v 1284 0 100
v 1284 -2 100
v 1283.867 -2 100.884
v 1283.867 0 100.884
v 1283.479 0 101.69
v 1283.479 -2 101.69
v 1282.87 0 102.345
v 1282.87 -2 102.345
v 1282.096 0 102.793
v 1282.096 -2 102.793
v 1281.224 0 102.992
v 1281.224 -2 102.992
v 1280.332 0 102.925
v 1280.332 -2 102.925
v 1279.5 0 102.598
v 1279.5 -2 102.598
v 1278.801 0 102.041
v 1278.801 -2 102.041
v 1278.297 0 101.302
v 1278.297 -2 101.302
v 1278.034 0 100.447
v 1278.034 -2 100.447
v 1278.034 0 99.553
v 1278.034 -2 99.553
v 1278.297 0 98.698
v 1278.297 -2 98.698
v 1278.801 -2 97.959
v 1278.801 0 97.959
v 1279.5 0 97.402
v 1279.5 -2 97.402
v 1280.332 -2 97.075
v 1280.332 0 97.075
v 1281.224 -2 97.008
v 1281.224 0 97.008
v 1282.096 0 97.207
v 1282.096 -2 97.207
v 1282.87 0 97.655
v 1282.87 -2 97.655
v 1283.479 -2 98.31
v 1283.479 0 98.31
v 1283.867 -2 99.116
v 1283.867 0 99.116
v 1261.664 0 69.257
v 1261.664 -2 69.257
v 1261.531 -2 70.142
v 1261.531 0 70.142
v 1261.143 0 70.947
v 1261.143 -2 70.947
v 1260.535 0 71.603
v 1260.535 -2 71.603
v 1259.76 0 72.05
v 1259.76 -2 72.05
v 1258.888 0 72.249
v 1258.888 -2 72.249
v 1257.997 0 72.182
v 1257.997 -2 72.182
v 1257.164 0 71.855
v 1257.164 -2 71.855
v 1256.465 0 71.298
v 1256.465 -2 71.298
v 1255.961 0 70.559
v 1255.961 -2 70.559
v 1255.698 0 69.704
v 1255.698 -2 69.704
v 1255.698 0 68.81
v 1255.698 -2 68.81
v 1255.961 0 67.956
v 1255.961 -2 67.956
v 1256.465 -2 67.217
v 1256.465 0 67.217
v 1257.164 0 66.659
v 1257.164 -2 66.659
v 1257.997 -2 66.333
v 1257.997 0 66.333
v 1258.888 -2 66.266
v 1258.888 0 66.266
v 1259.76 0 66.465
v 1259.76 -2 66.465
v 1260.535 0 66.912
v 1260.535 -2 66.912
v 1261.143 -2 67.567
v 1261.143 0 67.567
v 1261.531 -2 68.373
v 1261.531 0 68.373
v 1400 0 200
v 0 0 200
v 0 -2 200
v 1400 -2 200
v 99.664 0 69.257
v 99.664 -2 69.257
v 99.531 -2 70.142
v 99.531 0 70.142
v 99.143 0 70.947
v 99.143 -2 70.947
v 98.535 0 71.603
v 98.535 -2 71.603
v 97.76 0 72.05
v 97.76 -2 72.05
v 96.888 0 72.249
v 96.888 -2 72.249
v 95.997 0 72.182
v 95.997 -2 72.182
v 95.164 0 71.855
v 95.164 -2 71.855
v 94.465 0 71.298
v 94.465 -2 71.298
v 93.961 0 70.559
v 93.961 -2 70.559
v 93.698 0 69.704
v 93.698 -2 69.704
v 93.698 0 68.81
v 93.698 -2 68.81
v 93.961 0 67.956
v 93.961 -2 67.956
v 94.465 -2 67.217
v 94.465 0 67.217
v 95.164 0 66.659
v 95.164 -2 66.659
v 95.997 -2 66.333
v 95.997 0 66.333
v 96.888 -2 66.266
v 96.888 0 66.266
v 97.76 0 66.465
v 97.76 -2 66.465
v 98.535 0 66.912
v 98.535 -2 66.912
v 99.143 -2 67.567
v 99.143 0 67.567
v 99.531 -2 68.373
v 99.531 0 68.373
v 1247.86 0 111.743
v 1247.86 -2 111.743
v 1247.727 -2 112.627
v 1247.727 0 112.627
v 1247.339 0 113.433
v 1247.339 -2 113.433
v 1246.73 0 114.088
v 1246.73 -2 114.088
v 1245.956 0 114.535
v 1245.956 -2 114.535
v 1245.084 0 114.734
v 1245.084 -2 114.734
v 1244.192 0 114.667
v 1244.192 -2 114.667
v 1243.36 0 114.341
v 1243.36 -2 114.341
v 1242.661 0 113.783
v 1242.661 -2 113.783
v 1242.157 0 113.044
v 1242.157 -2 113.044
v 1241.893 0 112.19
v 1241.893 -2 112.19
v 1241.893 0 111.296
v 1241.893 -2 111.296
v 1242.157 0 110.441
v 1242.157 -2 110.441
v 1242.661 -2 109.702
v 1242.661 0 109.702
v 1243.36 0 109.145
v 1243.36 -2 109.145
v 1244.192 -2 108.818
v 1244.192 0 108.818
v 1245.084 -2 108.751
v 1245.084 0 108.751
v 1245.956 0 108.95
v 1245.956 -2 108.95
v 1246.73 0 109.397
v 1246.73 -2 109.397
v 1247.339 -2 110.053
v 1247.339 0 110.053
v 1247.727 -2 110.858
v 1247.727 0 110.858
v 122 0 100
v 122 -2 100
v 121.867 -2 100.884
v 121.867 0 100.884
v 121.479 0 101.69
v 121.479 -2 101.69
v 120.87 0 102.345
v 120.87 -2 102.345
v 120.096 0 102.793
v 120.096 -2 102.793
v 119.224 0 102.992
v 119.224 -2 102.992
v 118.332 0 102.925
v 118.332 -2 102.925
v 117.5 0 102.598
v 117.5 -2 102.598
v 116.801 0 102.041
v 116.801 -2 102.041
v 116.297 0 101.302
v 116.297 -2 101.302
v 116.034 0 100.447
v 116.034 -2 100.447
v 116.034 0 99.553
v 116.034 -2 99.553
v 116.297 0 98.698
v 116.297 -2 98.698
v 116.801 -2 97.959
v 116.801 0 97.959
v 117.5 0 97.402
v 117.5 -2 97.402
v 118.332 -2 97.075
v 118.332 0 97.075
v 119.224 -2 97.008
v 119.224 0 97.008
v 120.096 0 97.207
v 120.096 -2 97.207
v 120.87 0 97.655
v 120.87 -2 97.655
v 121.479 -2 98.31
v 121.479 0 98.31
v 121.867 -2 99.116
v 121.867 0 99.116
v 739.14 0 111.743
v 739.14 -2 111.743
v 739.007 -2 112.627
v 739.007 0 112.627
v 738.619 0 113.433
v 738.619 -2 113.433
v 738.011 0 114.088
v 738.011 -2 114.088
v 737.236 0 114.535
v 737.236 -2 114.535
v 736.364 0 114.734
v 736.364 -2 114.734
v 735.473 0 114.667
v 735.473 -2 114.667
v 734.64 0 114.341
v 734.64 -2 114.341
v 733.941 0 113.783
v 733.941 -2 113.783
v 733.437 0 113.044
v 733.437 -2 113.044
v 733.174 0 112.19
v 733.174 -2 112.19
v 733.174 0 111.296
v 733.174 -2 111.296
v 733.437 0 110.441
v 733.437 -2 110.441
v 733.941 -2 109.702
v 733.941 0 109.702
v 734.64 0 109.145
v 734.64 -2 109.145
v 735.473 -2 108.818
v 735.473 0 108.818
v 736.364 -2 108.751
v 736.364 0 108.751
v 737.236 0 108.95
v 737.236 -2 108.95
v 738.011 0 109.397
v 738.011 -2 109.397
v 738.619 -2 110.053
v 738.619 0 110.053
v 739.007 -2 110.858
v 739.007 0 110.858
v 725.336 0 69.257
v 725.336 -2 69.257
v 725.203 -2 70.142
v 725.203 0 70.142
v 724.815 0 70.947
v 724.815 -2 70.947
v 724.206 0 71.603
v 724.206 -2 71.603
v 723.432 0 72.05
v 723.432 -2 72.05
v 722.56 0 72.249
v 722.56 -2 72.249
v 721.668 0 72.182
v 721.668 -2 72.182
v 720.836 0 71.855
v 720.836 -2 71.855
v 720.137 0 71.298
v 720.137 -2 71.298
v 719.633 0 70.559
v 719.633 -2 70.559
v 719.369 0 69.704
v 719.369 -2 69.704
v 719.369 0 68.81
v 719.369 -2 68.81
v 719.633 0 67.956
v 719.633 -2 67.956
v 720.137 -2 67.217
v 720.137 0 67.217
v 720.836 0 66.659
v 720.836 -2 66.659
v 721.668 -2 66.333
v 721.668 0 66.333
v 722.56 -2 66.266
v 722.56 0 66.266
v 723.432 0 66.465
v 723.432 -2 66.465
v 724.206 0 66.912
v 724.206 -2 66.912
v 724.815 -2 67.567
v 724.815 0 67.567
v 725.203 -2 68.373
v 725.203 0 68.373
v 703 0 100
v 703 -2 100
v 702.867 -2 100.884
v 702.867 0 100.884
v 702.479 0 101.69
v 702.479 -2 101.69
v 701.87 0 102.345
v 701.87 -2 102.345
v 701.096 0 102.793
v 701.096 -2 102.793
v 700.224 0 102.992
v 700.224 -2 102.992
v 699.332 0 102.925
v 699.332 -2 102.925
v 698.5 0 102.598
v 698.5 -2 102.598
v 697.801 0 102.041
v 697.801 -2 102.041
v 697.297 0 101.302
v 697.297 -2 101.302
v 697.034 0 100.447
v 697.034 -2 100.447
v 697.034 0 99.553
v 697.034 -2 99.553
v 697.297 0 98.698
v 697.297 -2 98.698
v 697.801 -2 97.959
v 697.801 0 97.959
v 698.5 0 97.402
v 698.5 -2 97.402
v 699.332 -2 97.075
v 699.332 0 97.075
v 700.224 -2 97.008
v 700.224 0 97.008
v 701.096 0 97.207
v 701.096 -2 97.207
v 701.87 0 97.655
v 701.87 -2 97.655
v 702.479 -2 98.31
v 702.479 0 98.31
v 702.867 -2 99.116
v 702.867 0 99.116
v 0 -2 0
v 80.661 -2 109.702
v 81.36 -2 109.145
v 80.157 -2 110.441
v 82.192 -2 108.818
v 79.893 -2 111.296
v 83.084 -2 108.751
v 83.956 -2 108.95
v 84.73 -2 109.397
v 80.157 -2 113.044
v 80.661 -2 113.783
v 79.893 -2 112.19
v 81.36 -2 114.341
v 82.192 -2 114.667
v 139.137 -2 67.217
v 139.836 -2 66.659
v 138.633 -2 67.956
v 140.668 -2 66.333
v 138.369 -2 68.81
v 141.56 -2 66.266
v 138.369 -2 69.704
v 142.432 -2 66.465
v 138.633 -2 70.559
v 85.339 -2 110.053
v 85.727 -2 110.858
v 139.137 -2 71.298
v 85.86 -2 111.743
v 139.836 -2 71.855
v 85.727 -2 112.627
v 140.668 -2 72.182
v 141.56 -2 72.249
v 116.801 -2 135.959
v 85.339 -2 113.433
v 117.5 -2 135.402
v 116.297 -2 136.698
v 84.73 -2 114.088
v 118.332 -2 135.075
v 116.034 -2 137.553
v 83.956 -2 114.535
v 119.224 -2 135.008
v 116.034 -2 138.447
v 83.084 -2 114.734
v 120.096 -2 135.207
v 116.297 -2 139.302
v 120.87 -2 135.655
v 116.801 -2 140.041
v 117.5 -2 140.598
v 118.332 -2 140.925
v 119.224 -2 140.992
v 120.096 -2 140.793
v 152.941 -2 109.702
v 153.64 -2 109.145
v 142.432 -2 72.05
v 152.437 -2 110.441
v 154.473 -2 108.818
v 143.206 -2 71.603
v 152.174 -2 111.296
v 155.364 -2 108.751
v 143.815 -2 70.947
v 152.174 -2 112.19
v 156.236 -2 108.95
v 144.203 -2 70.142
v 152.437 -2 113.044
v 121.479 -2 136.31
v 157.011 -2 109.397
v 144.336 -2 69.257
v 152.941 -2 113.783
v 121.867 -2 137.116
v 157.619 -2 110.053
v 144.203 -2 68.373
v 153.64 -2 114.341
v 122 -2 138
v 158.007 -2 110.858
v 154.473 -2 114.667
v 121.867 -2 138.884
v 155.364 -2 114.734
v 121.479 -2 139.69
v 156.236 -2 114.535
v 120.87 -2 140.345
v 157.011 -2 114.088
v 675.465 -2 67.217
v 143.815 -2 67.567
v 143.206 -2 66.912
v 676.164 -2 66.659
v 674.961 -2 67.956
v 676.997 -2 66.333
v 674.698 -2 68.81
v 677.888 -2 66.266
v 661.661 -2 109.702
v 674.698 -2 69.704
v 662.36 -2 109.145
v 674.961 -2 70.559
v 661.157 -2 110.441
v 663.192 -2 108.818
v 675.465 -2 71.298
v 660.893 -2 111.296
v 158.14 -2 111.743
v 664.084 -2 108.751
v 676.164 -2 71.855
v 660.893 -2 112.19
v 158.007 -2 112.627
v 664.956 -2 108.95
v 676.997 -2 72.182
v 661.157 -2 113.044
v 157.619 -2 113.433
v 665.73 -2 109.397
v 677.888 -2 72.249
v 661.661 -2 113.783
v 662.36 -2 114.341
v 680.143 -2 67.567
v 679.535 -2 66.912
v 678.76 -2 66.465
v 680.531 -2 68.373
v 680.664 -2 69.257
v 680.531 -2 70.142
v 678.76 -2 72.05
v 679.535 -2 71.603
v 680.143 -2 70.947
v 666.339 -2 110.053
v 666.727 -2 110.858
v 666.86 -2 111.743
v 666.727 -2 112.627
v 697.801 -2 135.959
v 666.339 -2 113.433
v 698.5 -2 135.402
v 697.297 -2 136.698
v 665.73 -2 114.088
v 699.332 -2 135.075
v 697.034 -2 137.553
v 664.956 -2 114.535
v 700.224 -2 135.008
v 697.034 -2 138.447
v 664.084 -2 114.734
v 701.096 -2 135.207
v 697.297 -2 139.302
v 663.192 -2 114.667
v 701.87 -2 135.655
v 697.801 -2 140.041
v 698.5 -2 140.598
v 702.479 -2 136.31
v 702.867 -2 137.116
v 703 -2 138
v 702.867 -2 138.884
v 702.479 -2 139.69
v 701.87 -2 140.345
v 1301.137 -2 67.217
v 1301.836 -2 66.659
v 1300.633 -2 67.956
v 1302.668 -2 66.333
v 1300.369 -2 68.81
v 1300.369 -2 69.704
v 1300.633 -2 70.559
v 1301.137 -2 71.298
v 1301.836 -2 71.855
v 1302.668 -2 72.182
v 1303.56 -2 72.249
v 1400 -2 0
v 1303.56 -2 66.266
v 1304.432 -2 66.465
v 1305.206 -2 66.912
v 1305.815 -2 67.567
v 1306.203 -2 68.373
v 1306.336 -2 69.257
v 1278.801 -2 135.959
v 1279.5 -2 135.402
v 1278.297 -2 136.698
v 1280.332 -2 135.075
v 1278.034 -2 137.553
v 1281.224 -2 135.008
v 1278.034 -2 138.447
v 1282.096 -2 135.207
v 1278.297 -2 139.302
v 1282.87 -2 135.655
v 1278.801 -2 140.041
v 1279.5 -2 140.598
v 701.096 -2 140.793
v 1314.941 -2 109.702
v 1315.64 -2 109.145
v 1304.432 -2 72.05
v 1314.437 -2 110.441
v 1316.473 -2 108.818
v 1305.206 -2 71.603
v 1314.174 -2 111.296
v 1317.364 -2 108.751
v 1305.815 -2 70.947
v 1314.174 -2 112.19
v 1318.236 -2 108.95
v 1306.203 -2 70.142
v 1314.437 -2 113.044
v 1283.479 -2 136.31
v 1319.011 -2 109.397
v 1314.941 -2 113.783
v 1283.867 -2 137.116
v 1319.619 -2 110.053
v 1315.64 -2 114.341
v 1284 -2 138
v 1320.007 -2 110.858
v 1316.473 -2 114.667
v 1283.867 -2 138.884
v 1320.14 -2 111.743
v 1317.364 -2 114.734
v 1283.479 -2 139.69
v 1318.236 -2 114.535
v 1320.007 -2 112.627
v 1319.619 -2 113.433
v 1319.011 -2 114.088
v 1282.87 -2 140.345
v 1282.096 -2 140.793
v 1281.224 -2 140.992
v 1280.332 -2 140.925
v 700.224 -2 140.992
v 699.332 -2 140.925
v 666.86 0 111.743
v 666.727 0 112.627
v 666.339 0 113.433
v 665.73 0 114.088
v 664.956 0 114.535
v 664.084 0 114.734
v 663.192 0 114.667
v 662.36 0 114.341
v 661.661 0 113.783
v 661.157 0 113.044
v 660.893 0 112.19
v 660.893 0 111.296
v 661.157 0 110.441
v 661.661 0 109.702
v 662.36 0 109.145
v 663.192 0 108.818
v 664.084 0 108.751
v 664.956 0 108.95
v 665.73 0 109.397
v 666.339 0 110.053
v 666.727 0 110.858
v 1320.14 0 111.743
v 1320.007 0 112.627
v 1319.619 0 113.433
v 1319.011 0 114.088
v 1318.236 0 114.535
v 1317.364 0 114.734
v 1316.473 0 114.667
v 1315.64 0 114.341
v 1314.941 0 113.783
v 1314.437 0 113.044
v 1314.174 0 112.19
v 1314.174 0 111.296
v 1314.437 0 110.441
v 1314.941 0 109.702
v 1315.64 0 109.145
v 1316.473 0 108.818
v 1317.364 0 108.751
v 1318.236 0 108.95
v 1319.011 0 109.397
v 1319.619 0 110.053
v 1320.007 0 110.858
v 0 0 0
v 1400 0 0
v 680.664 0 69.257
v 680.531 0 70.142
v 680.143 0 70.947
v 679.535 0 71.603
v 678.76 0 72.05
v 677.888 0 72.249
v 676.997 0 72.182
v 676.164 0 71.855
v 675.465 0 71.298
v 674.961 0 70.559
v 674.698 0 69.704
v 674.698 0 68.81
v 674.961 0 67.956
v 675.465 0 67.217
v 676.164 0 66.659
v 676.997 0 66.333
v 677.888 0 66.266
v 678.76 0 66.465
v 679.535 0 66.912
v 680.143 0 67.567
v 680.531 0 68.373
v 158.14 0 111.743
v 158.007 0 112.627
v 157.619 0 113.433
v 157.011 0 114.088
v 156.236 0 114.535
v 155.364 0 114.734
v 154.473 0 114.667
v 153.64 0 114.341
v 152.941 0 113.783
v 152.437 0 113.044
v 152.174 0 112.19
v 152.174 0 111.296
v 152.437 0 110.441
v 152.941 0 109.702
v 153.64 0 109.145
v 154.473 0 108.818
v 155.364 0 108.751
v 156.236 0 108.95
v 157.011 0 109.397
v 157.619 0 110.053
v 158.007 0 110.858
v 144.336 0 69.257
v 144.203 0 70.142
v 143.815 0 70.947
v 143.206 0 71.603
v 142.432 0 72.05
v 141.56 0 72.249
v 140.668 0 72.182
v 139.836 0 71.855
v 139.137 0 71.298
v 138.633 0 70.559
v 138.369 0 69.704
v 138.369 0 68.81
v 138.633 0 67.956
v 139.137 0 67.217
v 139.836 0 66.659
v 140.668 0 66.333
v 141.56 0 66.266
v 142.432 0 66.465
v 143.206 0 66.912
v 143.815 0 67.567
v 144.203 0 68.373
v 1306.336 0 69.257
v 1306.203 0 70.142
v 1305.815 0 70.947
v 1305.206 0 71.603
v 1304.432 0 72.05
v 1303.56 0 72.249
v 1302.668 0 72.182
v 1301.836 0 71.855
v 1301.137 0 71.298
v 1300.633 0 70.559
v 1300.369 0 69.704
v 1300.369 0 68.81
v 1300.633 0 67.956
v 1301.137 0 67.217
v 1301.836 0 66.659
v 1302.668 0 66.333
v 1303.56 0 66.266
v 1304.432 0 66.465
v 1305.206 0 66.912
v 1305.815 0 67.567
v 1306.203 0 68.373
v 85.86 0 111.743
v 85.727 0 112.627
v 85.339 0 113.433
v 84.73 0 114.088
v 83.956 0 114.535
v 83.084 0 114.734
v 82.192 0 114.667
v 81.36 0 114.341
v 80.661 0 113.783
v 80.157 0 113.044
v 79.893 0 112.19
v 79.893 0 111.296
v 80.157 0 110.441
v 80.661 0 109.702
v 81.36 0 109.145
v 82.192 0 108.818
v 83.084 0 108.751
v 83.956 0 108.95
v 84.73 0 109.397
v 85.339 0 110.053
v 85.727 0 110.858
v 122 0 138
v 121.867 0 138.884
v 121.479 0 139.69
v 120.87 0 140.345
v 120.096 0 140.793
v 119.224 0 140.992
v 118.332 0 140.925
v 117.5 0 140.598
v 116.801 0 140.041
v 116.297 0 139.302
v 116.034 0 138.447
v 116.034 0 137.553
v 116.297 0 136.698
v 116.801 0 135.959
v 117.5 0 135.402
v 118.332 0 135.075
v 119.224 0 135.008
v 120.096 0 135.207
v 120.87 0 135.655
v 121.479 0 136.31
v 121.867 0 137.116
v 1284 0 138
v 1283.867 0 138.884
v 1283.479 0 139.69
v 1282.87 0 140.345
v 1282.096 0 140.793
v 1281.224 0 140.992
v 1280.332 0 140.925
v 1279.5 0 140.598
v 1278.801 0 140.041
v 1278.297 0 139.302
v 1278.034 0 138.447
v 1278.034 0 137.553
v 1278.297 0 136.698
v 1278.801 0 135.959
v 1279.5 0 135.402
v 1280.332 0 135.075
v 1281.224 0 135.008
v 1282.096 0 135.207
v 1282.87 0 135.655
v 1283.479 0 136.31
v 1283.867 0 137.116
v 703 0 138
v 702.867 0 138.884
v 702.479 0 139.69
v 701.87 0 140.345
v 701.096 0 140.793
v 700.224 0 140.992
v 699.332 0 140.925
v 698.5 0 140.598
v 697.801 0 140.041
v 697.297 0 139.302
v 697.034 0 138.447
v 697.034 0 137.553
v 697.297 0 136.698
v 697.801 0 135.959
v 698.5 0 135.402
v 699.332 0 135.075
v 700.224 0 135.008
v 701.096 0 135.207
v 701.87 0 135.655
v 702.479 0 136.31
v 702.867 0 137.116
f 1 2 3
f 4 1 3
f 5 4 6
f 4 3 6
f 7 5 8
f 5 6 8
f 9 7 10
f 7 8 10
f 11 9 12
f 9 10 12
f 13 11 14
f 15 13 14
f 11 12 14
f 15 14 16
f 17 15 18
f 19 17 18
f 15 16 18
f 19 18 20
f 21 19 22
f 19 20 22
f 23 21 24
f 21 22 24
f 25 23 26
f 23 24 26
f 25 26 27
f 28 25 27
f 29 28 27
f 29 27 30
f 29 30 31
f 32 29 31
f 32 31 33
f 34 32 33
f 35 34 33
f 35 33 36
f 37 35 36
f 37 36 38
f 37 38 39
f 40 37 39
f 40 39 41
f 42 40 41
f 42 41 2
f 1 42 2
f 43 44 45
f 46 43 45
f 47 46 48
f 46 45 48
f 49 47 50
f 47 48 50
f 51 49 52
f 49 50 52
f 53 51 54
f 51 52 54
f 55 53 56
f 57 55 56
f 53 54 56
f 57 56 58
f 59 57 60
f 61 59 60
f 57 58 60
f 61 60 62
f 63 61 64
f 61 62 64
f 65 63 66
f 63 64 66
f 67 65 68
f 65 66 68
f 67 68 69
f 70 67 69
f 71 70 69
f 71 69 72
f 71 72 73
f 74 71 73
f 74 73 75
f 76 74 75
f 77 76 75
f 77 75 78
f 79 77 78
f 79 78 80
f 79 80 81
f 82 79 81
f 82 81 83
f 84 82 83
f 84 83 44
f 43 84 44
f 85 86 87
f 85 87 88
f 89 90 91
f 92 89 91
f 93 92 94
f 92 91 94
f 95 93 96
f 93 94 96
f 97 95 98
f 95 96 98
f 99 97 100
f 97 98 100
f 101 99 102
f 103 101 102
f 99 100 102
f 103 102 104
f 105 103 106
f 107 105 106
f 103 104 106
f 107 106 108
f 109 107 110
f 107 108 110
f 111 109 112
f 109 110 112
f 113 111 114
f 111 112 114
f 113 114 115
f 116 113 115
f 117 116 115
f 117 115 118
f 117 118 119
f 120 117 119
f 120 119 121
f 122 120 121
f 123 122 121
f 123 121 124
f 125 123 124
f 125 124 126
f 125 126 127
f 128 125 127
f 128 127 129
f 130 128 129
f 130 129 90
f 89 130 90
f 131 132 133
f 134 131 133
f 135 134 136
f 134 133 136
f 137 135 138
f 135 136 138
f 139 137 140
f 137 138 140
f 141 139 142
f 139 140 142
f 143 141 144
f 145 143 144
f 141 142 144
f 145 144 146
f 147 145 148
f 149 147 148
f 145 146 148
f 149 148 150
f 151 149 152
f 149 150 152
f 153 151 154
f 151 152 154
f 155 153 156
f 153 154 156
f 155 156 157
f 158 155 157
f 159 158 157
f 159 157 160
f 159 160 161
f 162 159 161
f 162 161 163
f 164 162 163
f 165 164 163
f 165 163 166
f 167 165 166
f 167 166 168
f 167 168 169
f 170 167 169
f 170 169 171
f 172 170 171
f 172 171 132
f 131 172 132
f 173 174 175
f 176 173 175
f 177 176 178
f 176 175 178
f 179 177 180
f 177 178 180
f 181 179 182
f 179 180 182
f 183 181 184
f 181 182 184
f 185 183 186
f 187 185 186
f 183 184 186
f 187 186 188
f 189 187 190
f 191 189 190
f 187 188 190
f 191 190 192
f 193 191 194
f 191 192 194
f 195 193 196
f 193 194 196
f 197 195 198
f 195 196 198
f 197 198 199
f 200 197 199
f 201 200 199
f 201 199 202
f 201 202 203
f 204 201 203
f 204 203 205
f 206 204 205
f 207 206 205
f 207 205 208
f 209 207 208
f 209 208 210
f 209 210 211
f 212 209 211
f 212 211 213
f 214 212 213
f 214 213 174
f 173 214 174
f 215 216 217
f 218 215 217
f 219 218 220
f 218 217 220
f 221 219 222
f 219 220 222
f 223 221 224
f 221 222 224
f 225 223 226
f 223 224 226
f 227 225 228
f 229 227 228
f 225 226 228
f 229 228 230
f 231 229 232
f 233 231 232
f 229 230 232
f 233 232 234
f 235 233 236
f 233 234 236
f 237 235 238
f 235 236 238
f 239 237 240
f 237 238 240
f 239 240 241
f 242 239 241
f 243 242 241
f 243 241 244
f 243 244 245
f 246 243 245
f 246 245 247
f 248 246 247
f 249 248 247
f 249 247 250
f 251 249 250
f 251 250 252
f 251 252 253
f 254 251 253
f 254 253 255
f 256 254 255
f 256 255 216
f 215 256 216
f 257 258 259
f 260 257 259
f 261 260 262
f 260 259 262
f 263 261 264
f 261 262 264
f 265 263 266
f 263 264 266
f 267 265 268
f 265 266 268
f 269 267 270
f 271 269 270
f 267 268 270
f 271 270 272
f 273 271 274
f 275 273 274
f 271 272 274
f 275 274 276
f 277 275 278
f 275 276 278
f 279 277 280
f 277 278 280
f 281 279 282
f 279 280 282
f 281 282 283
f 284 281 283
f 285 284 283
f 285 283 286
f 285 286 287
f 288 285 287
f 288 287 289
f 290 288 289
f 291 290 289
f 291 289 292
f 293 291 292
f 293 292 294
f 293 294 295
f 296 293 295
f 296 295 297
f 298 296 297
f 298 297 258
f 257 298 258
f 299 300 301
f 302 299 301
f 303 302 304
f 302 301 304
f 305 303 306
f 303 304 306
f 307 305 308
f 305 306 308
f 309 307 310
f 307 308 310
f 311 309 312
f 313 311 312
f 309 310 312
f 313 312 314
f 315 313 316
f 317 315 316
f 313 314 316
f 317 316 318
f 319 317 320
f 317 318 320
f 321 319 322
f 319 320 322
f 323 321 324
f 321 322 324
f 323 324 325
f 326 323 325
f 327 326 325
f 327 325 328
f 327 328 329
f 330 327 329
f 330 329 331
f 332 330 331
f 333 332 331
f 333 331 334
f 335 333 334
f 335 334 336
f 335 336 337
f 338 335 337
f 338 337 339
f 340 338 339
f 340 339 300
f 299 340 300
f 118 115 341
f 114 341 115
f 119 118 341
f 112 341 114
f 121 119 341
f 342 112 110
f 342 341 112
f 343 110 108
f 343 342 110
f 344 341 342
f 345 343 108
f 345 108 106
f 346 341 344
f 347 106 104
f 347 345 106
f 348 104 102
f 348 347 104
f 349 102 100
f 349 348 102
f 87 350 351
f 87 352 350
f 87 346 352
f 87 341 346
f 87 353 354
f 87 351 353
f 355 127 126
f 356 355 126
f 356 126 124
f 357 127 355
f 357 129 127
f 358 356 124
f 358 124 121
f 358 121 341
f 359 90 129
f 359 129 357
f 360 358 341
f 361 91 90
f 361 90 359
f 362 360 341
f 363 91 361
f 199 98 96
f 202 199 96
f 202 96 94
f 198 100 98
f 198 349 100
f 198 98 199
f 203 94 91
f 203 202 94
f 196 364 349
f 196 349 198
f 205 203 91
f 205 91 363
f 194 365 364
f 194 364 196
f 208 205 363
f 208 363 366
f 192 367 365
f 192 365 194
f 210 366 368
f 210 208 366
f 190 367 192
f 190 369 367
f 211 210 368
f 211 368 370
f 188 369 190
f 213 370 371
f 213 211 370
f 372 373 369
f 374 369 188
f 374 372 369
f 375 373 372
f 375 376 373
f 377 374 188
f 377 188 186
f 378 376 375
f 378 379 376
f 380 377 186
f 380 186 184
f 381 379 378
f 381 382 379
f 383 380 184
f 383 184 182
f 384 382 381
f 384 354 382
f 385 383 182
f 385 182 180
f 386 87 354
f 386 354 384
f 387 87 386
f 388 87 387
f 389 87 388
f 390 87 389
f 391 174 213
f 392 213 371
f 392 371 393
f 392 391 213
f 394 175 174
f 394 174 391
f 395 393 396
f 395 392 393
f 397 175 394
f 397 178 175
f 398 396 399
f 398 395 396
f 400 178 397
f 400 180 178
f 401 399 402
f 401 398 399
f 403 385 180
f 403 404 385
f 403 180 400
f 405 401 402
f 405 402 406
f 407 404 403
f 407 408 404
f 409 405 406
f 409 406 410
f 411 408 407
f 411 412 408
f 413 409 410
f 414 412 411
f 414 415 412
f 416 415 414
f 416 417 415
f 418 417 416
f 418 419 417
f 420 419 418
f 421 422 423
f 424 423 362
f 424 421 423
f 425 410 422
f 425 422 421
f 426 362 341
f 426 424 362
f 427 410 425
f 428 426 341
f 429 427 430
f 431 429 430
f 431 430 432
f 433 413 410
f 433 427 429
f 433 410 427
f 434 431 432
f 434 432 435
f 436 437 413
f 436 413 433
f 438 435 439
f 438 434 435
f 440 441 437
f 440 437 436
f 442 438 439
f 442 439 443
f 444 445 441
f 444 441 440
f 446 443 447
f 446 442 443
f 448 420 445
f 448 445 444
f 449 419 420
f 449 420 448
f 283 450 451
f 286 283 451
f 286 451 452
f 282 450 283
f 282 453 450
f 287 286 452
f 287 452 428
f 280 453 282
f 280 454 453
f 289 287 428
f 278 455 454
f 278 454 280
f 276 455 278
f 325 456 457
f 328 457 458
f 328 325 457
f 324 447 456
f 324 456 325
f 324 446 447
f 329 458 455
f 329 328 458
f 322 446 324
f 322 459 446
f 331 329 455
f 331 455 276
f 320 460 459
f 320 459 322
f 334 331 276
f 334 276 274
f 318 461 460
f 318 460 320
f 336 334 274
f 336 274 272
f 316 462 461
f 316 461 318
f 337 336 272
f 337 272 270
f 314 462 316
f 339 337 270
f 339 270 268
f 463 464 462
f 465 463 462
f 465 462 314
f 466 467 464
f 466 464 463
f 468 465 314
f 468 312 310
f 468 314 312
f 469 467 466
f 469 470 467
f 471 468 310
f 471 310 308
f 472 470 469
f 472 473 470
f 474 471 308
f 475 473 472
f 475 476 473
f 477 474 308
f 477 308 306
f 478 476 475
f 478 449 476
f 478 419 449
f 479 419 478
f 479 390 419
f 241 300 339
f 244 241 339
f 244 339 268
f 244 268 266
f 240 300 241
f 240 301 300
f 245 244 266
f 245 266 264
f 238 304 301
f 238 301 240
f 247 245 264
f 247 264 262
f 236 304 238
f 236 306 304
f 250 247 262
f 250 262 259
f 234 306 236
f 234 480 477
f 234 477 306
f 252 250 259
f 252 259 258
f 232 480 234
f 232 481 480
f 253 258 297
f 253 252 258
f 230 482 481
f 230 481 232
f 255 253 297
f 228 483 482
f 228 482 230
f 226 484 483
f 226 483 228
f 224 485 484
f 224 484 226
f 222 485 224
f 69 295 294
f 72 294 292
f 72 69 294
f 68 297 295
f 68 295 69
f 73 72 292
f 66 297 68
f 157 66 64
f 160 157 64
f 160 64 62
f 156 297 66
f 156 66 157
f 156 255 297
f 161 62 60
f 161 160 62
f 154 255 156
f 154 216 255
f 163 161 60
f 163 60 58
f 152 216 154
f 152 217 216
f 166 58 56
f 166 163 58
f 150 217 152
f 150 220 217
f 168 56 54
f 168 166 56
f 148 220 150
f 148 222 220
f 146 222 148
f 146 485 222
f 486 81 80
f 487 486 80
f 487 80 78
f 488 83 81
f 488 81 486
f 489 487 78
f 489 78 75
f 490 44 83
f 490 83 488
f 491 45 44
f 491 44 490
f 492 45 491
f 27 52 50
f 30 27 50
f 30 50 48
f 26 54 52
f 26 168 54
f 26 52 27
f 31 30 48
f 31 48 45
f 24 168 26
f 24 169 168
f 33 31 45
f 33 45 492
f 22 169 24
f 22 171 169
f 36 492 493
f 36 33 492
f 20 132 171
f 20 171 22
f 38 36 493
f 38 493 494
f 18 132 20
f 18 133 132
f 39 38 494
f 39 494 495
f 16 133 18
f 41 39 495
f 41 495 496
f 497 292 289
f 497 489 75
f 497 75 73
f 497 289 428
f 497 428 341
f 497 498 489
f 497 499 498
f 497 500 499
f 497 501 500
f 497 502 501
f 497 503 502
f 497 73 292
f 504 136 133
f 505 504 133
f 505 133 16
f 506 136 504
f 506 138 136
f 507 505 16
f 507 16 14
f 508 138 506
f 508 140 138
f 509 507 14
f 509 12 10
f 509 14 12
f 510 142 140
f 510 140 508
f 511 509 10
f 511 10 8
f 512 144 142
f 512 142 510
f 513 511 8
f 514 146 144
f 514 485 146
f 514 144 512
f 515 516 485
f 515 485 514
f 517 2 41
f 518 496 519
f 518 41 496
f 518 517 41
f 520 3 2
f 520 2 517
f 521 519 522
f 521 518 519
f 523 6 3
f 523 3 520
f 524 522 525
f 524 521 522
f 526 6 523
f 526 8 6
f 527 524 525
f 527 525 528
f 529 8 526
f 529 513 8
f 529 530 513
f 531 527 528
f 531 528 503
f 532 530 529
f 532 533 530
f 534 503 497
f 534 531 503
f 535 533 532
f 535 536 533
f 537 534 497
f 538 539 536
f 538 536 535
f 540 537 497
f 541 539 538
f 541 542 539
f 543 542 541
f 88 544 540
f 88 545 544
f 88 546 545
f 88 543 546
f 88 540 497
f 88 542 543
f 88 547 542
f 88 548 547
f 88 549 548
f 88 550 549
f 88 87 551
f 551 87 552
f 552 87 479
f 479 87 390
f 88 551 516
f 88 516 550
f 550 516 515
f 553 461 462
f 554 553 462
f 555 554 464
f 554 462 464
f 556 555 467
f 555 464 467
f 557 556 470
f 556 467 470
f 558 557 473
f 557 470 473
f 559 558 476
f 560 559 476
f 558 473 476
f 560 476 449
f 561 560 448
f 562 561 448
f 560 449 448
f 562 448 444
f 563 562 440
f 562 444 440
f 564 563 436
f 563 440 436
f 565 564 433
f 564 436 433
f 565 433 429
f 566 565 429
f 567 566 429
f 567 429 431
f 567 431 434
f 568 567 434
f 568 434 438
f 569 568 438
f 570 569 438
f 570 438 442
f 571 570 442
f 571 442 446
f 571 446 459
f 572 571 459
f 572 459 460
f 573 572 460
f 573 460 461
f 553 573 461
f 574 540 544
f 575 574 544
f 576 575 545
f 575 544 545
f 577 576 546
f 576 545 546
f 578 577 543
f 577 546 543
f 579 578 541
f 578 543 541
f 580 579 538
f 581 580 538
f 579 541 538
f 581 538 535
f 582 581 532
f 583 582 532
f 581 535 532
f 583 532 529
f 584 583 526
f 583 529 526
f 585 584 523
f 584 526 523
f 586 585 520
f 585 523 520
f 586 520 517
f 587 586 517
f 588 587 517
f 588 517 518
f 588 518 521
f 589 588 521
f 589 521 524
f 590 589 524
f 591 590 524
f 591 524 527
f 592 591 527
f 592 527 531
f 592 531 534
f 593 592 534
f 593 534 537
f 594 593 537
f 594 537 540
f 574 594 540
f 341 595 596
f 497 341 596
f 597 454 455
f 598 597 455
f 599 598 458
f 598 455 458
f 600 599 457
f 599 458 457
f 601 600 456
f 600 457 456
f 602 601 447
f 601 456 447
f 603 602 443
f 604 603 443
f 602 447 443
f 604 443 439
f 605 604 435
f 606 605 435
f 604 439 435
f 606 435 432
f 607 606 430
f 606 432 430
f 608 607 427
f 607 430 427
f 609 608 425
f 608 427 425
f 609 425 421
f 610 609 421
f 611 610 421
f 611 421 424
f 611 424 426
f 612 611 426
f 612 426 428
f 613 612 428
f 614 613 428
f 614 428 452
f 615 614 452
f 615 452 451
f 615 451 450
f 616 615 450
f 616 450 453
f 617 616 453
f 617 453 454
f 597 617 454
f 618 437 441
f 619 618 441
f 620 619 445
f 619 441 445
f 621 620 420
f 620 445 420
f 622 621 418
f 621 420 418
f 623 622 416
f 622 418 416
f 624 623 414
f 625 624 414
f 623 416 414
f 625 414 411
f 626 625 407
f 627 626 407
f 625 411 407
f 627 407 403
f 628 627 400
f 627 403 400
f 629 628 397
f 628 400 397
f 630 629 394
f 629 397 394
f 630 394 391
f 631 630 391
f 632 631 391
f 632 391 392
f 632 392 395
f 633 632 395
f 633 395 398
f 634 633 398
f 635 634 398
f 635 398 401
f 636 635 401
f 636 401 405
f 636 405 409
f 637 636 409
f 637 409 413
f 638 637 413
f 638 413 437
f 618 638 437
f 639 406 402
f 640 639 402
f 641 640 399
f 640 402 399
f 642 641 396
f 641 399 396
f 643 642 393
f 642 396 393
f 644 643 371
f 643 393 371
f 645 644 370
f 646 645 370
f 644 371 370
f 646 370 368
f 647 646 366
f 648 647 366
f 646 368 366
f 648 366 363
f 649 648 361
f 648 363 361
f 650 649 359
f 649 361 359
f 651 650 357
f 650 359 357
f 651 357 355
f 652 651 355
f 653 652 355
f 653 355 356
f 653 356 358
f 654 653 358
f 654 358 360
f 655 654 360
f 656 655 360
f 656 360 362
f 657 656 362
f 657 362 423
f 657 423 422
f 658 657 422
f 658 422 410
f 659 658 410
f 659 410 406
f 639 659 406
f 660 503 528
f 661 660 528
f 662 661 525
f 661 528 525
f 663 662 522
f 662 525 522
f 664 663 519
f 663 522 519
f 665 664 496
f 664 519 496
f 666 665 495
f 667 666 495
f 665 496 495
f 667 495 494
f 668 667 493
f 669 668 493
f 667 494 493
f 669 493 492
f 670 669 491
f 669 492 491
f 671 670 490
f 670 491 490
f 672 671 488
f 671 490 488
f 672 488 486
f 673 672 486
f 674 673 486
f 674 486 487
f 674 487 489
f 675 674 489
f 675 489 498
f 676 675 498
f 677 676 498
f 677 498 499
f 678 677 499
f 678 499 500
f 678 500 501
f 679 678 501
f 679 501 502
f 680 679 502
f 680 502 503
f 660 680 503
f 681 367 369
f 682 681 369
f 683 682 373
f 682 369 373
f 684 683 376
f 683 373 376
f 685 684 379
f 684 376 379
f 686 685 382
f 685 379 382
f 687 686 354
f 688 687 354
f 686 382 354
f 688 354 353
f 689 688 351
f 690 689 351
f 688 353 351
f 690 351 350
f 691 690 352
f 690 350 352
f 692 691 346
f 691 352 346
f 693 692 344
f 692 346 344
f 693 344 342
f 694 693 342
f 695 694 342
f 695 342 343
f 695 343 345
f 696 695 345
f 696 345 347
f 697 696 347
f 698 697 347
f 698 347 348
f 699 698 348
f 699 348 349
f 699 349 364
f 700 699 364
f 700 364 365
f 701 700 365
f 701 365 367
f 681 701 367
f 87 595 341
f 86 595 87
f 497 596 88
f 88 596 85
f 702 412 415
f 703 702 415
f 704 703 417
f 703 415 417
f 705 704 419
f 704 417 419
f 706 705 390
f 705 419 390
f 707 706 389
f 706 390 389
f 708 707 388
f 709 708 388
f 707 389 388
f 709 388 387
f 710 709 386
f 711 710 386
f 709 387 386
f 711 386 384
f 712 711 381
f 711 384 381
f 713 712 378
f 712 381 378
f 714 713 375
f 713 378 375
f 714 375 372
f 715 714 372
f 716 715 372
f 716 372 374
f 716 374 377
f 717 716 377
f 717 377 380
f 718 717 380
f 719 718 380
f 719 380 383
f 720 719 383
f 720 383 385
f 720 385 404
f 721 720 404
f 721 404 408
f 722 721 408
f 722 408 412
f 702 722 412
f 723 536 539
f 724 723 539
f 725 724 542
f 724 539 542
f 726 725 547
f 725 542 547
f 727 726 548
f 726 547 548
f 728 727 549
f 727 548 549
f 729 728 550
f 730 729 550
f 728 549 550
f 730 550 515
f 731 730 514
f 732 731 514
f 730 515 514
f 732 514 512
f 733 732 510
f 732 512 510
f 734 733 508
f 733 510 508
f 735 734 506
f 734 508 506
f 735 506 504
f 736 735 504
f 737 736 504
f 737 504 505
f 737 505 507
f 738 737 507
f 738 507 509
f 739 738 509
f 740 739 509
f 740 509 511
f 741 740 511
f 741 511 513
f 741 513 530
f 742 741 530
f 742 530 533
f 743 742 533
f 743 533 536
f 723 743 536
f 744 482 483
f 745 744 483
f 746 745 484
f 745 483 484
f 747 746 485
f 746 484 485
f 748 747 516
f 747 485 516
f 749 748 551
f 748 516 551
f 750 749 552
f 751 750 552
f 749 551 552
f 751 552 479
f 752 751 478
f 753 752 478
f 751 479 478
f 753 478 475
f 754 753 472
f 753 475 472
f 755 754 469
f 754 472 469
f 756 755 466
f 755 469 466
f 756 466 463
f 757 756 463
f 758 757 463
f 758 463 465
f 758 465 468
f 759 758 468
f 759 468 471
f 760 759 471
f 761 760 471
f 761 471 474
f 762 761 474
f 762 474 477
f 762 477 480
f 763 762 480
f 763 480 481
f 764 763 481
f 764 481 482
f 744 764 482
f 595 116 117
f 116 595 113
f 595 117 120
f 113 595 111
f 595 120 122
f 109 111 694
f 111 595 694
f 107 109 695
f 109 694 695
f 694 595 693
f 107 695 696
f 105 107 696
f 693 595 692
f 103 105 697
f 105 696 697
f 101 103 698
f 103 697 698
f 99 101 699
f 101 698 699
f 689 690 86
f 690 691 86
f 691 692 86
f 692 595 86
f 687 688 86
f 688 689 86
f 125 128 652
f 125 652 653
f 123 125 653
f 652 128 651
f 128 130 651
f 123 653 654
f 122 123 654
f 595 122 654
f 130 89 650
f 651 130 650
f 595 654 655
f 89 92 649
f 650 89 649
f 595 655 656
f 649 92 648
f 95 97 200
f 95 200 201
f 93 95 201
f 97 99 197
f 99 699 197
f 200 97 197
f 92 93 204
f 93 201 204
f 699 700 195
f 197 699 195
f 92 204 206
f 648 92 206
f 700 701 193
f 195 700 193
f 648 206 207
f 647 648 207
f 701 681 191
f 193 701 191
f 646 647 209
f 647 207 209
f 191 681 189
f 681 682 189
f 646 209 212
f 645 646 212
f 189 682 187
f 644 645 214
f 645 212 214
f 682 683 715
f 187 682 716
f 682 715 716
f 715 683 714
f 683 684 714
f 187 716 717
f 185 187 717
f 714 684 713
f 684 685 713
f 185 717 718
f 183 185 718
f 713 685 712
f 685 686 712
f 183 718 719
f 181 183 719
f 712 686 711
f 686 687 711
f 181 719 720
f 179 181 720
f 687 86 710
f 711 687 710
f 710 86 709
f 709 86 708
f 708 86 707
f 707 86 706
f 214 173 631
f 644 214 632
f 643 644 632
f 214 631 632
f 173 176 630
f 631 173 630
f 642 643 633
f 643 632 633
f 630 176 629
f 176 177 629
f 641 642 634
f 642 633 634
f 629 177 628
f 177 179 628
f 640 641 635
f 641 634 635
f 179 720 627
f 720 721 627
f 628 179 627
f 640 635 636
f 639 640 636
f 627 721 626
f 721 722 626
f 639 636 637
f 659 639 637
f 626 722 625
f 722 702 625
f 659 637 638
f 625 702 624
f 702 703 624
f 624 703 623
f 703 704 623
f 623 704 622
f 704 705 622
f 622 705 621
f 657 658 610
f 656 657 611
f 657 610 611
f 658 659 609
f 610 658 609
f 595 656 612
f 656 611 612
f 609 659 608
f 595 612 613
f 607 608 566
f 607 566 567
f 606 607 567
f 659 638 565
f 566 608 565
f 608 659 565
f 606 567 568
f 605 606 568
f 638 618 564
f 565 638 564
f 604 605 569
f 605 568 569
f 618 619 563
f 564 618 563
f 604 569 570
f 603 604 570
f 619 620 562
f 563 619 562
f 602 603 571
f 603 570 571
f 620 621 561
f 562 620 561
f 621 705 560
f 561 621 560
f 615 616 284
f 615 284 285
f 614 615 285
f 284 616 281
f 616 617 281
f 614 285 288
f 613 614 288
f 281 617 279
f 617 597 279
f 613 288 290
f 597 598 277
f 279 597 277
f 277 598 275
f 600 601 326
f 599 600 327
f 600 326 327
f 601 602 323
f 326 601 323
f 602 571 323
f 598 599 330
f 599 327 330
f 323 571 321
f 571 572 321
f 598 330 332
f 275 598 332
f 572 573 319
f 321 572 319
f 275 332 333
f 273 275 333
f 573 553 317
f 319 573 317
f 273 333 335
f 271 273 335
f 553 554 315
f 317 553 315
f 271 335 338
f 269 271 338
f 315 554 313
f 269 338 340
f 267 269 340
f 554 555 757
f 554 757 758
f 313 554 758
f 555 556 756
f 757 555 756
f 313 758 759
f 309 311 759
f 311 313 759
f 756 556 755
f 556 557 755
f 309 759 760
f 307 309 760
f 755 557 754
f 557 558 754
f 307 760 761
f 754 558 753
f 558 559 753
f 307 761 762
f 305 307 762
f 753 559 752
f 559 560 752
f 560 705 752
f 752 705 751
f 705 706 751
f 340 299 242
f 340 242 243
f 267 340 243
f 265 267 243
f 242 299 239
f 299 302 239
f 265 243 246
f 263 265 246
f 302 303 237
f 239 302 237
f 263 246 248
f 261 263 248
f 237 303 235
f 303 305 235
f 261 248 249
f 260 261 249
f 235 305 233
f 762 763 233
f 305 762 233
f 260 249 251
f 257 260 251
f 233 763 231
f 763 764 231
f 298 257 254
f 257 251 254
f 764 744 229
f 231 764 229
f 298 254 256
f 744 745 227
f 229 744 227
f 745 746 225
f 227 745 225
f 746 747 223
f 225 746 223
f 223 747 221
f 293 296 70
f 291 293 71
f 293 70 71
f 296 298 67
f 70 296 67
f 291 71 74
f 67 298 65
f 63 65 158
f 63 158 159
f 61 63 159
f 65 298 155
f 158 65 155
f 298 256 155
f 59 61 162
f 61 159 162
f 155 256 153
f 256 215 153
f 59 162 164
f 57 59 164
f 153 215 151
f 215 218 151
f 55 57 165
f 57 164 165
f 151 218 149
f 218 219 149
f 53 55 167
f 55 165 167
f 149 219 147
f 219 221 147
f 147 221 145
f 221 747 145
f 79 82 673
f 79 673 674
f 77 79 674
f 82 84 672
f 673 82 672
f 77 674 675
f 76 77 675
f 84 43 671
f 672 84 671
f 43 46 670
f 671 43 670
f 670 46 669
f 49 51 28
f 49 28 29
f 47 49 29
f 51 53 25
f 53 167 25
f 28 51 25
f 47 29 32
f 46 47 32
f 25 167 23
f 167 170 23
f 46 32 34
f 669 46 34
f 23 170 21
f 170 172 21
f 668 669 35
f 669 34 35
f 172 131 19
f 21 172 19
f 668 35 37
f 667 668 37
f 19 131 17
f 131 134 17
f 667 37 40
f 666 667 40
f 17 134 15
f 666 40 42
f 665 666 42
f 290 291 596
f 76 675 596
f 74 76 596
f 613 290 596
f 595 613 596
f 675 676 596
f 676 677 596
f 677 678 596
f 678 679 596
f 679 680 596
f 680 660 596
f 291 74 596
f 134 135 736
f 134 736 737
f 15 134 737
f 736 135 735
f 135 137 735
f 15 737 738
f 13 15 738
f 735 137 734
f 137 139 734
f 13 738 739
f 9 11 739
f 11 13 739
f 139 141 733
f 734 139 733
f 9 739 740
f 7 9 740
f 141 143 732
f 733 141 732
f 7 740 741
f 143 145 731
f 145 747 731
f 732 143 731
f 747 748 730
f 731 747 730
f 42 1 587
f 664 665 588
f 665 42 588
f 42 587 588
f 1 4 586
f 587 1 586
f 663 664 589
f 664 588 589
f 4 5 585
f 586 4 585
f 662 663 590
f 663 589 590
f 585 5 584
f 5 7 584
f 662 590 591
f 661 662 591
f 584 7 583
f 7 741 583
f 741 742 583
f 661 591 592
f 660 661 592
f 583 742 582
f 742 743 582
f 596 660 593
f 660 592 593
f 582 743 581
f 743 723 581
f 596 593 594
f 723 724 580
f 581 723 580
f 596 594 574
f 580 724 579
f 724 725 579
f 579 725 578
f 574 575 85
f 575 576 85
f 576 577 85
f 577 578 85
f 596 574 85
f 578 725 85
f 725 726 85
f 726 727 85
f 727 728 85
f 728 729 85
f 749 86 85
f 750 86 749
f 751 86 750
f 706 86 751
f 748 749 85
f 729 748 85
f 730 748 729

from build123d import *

# Parameters (mm, degrees)
F0_W     = 1400
F0_H     = 200
F1_DEPTH = 2
F2_R     = 3
F3_DEPTH = 2.001


with BuildPart() as f1:
    # F0 (on Front) → F1 (new body)
    with BuildSketch(Plane.XZ):
        with Locations((700, 100)):
            Rectangle(F0_W, F0_H)
    extrude(amount=F1_DEPTH)

    # F2 (on face) → F3 (cut, through all)
    with BuildSketch(Plane.XZ.offset(2)):
        with Locations((700, 100)):
            Circle(F2_R)
        with Locations((700, 138)):
            Circle(F2_R)
        with Locations((663.859852, 111.742646)):
            Circle(F2_R)
        with Locations((677.66416, 69.257354)):
            Circle(F2_R)
        with Locations((722.33584, 69.257354)):
            Circle(F2_R)
        with Locations((736.140148, 111.742646)):
            Circle(F2_R)
        with Locations((119, 138)):
            Circle(F2_R)
        with Locations((82.859852, 111.742646)):
            Circle(F2_R)
        with Locations((96.66416, 69.257354)):
            Circle(F2_R)
        with Locations((155.140148, 111.742646)):
            Circle(F2_R)
        with Locations((119, 100)):
            Circle(F2_R)
        with Locations((141.33584, 69.257354)):
            Circle(F2_R)
        with Locations((1317.140148, 111.742646)):
            Circle(F2_R)
        with Locations((1303.33584, 69.257354)):
            Circle(F2_R)
        with Locations((1258.66416, 69.257354)):
            Circle(F2_R)
        with Locations((1244.859852, 111.742646)):
            Circle(F2_R)
        with Locations((1281, 100)):
            Circle(F2_R)
        with Locations((1281, 138)):
            Circle(F2_R)
    extrude(amount=-F3_DEPTH, mode=Mode.SUBTRACT)


solid = f1.part
